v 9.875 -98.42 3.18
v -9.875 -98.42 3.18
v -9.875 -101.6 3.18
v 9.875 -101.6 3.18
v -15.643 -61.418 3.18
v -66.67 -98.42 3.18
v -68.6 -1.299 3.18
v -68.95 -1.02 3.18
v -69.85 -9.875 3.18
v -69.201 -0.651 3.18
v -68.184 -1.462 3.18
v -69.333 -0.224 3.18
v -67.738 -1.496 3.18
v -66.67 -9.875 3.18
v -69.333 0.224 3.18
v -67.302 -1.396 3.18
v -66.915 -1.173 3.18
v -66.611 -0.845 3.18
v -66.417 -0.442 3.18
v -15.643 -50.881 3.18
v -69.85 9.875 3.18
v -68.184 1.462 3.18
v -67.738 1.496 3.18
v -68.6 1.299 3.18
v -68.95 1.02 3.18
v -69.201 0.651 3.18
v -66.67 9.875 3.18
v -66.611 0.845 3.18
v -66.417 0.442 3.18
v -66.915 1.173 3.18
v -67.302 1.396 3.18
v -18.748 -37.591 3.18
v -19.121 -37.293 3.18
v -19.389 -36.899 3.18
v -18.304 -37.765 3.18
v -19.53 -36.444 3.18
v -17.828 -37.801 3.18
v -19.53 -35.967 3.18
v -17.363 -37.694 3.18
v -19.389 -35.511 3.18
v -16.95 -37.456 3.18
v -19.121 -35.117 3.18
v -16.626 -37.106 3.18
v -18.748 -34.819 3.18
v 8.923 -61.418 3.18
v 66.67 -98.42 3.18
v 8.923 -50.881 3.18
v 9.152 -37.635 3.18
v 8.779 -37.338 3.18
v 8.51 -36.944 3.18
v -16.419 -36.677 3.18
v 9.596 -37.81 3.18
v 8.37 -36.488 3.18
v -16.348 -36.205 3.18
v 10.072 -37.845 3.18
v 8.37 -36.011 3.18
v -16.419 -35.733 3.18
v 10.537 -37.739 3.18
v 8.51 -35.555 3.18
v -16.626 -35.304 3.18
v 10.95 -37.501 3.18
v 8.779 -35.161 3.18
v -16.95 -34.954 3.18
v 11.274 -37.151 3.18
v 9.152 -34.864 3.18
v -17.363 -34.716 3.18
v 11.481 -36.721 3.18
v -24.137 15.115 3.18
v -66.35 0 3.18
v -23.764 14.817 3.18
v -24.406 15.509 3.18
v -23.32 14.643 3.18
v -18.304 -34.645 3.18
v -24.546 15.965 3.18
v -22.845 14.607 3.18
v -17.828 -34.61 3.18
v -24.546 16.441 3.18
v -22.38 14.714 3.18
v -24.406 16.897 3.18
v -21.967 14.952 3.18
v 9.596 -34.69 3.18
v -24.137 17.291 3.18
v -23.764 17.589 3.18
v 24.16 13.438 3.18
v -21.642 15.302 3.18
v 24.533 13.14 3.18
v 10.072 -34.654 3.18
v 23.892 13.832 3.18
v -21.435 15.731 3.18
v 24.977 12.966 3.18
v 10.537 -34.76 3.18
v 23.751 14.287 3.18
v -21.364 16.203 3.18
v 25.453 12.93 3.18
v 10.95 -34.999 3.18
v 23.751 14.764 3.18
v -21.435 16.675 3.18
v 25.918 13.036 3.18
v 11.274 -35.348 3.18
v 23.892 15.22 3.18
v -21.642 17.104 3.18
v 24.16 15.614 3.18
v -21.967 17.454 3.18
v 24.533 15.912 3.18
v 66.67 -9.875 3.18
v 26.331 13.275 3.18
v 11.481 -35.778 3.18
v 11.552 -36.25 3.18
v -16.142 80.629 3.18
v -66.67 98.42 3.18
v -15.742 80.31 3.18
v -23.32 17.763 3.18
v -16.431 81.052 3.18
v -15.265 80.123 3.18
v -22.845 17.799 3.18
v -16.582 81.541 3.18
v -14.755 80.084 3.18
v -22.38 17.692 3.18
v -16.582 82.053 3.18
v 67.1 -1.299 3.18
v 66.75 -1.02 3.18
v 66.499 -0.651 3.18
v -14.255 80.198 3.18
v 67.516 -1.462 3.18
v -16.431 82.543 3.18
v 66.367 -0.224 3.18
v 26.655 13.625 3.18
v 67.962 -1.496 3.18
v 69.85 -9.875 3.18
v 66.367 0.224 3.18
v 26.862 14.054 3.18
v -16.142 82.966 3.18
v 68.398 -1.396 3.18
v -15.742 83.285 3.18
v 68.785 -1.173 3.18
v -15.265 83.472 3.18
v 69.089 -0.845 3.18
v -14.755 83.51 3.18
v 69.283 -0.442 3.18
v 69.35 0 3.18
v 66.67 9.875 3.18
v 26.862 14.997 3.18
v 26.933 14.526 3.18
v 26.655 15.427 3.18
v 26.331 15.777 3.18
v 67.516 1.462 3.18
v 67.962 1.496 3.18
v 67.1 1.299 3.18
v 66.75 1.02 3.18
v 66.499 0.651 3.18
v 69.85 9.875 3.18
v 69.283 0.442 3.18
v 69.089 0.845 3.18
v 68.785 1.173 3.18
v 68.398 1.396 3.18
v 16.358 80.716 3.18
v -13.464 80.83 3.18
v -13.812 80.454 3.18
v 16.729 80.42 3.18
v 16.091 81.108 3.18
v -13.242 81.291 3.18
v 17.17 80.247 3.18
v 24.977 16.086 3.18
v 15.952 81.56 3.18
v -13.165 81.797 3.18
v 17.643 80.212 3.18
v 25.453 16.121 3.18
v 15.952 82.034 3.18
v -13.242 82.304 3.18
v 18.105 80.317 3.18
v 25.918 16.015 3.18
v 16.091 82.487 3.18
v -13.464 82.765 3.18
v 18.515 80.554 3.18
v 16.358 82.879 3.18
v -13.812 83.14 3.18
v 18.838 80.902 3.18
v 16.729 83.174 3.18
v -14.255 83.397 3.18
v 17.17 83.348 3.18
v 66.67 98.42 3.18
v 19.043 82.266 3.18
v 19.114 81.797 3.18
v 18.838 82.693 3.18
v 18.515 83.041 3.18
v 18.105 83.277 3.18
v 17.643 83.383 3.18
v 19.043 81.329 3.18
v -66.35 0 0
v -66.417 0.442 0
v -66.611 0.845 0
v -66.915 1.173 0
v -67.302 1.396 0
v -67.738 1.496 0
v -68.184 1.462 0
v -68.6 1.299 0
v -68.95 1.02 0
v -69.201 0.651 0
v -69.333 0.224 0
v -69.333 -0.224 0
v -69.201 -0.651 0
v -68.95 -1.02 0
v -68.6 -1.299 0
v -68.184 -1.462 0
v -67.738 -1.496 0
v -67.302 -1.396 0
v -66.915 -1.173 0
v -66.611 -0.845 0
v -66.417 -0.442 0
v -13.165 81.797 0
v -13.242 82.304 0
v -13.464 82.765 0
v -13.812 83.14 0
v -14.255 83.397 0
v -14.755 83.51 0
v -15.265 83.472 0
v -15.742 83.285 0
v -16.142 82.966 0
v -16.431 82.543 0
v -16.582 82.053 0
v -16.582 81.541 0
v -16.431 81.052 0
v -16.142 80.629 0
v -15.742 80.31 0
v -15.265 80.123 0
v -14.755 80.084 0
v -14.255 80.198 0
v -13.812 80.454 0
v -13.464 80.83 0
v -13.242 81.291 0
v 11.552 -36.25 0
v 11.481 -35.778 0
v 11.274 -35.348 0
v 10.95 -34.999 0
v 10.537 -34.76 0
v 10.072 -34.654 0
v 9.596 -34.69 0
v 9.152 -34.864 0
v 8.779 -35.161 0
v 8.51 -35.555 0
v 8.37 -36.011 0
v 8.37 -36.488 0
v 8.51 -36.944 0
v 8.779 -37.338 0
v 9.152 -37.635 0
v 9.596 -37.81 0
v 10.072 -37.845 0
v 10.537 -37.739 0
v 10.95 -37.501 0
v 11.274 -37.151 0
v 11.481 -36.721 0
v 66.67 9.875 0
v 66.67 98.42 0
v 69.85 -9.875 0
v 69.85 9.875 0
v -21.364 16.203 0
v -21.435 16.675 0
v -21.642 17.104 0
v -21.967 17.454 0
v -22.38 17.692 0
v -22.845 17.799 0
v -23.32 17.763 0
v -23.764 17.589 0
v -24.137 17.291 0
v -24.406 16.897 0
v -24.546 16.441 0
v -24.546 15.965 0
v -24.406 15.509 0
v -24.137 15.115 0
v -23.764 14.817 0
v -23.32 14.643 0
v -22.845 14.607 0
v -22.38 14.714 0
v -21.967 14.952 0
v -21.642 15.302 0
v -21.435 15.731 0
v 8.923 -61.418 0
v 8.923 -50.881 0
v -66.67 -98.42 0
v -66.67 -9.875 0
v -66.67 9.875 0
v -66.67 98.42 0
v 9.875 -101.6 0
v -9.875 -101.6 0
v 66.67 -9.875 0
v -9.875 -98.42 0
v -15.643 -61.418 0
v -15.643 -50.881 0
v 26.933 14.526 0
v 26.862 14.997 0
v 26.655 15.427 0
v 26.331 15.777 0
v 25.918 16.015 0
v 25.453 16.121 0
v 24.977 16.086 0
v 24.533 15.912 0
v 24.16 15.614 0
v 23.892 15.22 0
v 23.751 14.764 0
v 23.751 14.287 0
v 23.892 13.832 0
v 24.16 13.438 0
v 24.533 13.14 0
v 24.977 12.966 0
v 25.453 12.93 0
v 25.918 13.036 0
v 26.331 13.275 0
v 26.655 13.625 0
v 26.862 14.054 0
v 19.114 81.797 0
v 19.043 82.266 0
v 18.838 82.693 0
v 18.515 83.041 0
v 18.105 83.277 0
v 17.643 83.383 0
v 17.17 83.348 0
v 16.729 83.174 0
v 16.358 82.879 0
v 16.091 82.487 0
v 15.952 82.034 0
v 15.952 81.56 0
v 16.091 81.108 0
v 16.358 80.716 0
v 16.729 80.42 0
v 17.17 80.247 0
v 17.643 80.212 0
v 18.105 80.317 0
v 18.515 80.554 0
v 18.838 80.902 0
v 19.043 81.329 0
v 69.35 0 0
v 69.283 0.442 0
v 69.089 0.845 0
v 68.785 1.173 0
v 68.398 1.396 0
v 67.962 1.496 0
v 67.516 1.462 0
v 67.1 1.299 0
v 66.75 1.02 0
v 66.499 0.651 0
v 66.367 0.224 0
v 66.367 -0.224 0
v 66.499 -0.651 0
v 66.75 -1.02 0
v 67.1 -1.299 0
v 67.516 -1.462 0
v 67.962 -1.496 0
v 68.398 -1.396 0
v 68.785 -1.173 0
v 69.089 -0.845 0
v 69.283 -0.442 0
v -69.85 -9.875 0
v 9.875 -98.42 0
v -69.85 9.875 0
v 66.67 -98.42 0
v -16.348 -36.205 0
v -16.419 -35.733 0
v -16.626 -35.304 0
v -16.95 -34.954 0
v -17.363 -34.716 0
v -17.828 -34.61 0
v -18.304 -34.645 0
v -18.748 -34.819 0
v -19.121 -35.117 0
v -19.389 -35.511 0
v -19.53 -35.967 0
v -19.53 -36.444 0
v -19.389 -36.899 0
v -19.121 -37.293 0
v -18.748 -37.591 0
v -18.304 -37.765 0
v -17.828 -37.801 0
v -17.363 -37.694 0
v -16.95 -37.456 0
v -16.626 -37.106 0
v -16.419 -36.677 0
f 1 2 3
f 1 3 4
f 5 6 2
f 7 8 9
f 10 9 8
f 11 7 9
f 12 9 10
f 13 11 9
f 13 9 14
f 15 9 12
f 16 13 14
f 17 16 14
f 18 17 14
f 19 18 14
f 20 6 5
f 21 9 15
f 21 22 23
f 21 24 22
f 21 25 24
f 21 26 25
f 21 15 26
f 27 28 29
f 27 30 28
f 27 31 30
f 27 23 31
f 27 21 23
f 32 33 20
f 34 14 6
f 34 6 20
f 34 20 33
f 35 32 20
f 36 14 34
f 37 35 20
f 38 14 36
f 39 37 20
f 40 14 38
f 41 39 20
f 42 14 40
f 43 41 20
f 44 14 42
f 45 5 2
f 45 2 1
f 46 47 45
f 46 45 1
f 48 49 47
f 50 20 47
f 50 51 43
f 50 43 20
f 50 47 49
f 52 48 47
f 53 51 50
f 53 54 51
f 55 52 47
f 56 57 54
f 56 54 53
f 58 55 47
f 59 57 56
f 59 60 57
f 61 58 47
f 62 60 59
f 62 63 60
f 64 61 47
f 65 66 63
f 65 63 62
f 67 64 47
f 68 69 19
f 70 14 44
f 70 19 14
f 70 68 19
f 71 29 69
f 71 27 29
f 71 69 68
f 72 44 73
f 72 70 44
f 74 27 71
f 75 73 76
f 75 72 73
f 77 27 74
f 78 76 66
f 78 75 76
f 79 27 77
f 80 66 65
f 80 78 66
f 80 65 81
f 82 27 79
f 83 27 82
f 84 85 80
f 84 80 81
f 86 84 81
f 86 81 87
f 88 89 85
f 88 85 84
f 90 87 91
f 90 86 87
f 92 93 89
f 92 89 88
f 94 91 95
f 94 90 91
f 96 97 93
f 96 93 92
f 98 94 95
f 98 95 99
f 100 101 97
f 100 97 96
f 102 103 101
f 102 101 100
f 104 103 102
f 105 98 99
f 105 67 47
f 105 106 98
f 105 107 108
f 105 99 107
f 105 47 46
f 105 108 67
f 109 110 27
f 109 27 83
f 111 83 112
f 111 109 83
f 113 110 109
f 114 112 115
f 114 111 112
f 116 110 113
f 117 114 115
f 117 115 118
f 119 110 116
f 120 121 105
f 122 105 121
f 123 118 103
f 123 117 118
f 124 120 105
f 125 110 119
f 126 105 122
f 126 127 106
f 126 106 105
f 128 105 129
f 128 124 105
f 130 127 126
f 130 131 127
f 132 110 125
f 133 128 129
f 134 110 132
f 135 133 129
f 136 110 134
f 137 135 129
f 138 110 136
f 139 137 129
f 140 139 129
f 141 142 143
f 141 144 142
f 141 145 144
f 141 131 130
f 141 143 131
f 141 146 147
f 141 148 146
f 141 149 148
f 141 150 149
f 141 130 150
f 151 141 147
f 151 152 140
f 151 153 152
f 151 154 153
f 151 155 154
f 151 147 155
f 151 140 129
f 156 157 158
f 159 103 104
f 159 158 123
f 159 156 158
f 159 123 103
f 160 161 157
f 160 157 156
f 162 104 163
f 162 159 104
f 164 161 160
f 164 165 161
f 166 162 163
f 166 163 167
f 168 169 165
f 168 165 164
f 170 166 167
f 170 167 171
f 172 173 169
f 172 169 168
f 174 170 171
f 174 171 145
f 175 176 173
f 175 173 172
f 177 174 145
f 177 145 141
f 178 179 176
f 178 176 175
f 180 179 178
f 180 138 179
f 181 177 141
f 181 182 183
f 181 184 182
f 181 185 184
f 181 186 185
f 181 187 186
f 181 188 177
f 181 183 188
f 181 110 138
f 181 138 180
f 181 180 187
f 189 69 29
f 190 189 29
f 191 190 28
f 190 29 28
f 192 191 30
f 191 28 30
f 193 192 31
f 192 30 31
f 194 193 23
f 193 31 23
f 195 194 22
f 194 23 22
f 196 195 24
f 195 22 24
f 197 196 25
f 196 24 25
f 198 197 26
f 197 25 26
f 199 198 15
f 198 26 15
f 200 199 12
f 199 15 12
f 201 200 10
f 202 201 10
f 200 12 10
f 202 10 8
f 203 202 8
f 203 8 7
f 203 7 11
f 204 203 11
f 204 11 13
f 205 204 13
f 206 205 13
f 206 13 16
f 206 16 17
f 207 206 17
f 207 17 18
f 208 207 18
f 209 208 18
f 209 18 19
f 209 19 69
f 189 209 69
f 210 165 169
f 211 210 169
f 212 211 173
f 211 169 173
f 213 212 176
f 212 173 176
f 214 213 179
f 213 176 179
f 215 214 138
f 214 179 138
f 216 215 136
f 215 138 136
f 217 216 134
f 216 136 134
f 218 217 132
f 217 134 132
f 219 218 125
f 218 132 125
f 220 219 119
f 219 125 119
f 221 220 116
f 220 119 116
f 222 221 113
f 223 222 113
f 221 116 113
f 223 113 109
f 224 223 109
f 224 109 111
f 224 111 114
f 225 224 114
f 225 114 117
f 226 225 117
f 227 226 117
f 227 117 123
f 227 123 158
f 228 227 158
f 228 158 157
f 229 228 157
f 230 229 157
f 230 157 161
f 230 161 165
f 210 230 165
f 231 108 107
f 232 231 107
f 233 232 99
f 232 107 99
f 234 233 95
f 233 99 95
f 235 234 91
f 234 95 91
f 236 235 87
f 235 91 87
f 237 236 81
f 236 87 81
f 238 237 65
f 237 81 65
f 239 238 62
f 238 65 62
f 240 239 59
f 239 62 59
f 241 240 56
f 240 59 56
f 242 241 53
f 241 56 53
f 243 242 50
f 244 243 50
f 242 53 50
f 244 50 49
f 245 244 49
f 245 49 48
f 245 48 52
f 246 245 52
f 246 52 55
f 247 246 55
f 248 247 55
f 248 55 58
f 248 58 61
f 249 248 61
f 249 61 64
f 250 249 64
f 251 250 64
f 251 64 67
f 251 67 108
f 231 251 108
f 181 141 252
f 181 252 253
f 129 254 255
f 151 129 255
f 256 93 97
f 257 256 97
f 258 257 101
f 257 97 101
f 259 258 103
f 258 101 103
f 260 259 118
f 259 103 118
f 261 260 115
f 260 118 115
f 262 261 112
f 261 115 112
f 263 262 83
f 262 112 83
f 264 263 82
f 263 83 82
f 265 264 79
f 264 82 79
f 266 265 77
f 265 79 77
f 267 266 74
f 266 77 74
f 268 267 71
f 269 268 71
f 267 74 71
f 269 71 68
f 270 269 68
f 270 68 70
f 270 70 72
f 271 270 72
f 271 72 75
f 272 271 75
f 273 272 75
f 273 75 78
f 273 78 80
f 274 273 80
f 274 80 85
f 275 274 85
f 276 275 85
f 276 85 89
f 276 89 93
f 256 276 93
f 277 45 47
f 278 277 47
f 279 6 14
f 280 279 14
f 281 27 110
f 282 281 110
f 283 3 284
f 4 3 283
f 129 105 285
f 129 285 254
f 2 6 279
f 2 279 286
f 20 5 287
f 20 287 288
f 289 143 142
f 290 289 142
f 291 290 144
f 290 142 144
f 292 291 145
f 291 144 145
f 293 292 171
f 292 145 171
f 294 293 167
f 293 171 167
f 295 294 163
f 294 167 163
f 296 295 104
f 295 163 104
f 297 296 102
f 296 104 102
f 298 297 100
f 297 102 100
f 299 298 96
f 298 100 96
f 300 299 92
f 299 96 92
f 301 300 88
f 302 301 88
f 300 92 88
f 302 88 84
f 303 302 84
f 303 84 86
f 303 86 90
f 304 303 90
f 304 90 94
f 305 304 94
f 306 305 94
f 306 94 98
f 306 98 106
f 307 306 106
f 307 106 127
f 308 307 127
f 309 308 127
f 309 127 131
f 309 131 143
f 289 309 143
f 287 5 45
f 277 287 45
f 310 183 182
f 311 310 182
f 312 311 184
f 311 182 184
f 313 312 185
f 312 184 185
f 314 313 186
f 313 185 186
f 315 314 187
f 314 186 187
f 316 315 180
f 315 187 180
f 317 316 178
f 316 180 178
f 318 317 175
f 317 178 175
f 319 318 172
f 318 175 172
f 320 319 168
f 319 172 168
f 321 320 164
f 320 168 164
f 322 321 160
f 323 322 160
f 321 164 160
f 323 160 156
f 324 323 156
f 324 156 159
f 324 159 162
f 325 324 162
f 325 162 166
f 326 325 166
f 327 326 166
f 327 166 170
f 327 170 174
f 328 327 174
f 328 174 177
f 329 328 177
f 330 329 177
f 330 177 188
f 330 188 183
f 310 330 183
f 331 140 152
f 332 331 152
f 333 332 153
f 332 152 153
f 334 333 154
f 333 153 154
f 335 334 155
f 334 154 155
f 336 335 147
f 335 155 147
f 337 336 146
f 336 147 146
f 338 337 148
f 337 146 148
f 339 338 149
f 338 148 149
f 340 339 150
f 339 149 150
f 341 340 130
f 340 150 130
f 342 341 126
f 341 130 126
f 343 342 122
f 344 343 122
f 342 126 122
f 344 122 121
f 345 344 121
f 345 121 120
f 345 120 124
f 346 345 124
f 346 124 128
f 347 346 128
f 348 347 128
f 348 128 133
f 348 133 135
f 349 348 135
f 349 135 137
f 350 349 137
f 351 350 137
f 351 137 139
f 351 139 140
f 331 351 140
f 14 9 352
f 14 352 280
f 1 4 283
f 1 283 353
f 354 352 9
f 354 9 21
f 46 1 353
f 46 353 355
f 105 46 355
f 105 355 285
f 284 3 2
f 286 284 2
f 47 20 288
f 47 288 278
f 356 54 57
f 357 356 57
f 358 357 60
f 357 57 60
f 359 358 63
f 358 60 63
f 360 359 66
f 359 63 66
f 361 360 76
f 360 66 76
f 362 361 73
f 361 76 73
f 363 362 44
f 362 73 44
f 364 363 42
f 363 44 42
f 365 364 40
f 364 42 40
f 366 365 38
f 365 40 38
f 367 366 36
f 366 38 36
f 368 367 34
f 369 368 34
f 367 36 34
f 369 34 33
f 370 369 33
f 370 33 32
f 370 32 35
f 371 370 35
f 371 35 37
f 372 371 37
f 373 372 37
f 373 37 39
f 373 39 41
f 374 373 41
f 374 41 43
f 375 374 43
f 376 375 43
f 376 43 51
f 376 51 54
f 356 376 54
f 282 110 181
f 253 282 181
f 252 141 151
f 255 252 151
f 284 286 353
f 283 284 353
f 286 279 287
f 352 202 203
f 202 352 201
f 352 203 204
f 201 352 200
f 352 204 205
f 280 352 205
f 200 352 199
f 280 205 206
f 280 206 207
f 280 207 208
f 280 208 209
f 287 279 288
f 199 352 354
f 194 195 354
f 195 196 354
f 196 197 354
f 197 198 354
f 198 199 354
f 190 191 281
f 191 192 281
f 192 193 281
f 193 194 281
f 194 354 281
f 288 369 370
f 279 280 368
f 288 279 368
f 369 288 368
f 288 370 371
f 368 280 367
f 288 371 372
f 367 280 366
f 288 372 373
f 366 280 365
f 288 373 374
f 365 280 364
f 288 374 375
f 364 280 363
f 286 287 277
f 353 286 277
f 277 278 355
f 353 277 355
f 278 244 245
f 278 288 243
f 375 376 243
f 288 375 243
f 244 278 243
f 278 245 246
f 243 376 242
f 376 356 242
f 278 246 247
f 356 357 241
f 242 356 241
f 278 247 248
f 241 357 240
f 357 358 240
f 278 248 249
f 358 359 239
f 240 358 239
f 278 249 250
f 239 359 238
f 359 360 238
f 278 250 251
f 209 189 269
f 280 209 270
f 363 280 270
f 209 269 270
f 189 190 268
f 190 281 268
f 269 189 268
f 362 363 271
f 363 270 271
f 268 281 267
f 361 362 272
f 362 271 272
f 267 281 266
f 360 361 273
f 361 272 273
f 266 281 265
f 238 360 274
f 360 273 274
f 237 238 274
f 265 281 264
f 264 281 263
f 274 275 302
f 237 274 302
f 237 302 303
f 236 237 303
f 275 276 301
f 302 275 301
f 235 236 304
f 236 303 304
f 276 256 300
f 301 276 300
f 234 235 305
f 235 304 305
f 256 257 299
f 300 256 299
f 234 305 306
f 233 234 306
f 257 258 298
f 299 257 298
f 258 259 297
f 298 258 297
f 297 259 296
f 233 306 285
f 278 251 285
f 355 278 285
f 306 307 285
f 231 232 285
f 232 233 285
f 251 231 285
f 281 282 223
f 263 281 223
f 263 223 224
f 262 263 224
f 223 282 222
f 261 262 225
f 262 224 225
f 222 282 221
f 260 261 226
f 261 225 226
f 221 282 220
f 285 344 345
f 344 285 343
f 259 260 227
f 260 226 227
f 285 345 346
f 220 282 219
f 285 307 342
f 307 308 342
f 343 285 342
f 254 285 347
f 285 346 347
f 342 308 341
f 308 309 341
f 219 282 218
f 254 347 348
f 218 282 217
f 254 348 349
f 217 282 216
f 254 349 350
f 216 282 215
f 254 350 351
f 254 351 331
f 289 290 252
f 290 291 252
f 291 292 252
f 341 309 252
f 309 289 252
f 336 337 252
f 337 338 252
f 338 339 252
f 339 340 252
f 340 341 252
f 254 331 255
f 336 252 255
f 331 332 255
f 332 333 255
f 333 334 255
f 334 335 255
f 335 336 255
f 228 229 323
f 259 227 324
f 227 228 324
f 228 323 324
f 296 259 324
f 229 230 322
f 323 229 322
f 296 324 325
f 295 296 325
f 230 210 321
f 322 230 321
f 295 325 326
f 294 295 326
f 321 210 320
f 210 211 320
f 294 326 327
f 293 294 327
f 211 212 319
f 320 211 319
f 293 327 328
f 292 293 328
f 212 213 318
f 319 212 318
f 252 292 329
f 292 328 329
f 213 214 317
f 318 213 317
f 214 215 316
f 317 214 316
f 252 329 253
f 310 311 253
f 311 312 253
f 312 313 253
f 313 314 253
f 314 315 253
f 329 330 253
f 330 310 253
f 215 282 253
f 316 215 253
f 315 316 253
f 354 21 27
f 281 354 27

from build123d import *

# Parameters (mm, degrees)
SKETCH1_W           = 139.7
SKETCH1_H           = 203.2
BOSS_EXTRUDE1_DEPTH = 3.18
SKETCH2_R           = 1.5
SKETCH2_W           = 3.18
SKETCH2_H           = 91.725
CUT_EXTRUDE1_DEPTH  = 4.18
SKETCH3_R           = 1.59
CUT_EXTRUDE2_DEPTH  = 4.18
SKETCH4_R           = 1.59
CUT_EXTRUDE3_DEPTH  = 4.18
SKETCH5_W           = 88.895716174
SKETCH5_H           = 168.56277979
BOSS_EXTRUDE2_DEPTH = 3.18
SKETCH6_W           = 20
SKETCH6_H           = 203.2
BOSS_EXTRUDE3_DEPTH = 3.18
SKETCH7_W           = 56.795
SKETCH7_H           = 3.18
CUT_EXTRUDE4_DEPTH  = 4.18
SKETCH8_W           = 133.34
SKETCH8_H           = 3.18
CUT_EXTRUDE5_DEPTH  = 4.18
SKETCH9_R           = 1.6
CUT_EXTRUDE6_DEPTH  = 4.18
SKETCH10_W          = 24.565797096
SKETCH10_H          = 10.537213664
CUT_EXTRUDE7_DEPTH  = 3.18
SKETCH11_R          = 1.59
SKETCH11_R_2        = 1.71788268
CUT_EXTRUDE8_DEPTH  = 35


with BuildPart() as part:
    # Sketch1 → Boss-Extrude1 (new body)
    with BuildSketch(Plane.XY):
        Rectangle(SKETCH1_W, SKETCH1_H)
    extrude(amount=BOSS_EXTRUDE1_DEPTH)

    # Sketch2 → Cut-Extrude1 (cut, through all)
    with BuildSketch(Plane.XY.offset(3.18)):
        with Locations((-67.85, 0)):
            Circle(SKETCH2_R)
        with Locations((67.85, 0)):
            Circle(SKETCH2_R)
        Polygon((-10, 101.6), (10, 101.6), (10, 98.42), (1.5, 98.42), (1.5, 94.42), (3.5, 94.42), (3.5, 91.42), (1.5, 91.42), (1.5, 88.42), (-1.5, 88.42), (-1.5, 91.42), (-3.5, 91.42), (-3.5, 94.42), (-1.5, 94.42), (-1.5, 98.42), (-10, 98.42), align=None)
        Polygon((-10, -101.6), (-10, -98.42), (-1.5, -98.42), (-1.5, -94.42), (-3.5, -94.42), (-3.5, -91.42), (-1.5, -91.42), (-1.5, -88.42), (1.5, -88.42), (1.5, -91.42), (3.5, -91.42), (3.5, -94.42), (1.5, -94.42), (1.5, -98.42), (10, -98.42), (10, -101.6), align=None)
        with Locations((-68.26, 55.7375)):
            Rectangle(SKETCH2_W, SKETCH2_H)
        with Locations((-68.26, -55.7375)):
            Rectangle(SKETCH2_W, SKETCH2_H)
        with Locations((68.26, -55.7375)):
            Rectangle(SKETCH2_W, SKETCH2_H)
        with Locations((68.26, 55.7375)):
            Rectangle(SKETCH2_W, SKETCH2_H)
    extrude(amount=-CUT_EXTRUDE1_DEPTH, mode=Mode.SUBTRACT)

    # Sketch3 → Cut-Extrude2 (cut, through all)
    with BuildSketch(Plane(origin=(0, 0, 0), x_dir=(-1, 0, 0), z_dir=(0, 0, -1))):
        with Locations((-35.67127699, -47.963396943)):
            Circle(SKETCH3_R)
        with Locations((-35.67127699, -30.777287406)):
            Circle(SKETCH3_R)
    extrude(amount=-CUT_EXTRUDE2_DEPTH, mode=Mode.SUBTRACT)

    # Sketch4 → Cut-Extrude3 (cut, through all)
    with BuildSketch(Plane(origin=(0, 0, 0), x_dir=(-1, 0, 0), z_dir=(0, 0, -1))):
        with Locations((-34.750723073, 80.736128989)):
            Circle(SKETCH4_R)
        with Locations((-34.750723073, 63.550019452)):
            Circle(SKETCH4_R)
        with Locations((36.249784221, 80.736128989)):
            Circle(SKETCH4_R)
        with Locations((36.249784221, 63.550019452)):
            Circle(SKETCH4_R)
        with Locations((35.983928162, -30.777287406)):
            Circle(SKETCH4_R)
        with Locations((35.983928162, -47.963396943)):
            Circle(SKETCH4_R)
        with Locations((-35.67127699, -30.777287406)):
            Circle(SKETCH4_R)
        with Locations((-35.67127699, -47.963396943)):
            Circle(SKETCH4_R)
    extrude(amount=-CUT_EXTRUDE3_DEPTH, mode=Mode.SUBTRACT)

    # Sketch5 → Boss-Extrude2 (add)
    with BuildSketch(Plane.XY.offset(3.18)):
        Rectangle(SKETCH5_W, SKETCH5_H)
    extrude(amount=-BOSS_EXTRUDE2_DEPTH)

    # Sketch6 → Boss-Extrude3 (add)
    with BuildSketch(Plane.XY.offset(3.18)):
        Rectangle(SKETCH6_W, SKETCH6_H)
    extrude(amount=-BOSS_EXTRUDE3_DEPTH)

    # Sketch7 → Cut-Extrude4 (cut, through all)
    with BuildSketch(Plane.XY.offset(3.18)):
        with Locations((-38.2725, -100.01)):
            Rectangle(SKETCH7_W, SKETCH7_H)
        with Locations((38.2725, -100.01)):
            Rectangle(SKETCH7_W, SKETCH7_H)
    extrude(amount=-CUT_EXTRUDE4_DEPTH, mode=Mode.SUBTRACT)

    # Sketch8 → Cut-Extrude5 (cut, through all)
    with BuildSketch(Plane.XY.offset(3.18)):
        with Locations((0, 100.01)):
            Rectangle(SKETCH8_W, SKETCH8_H)
    extrude(amount=-CUT_EXTRUDE5_DEPTH, mode=Mode.SUBTRACT)

    # Sketch9 → Cut-Extrude6 (cut, through all)
    with BuildSketch(Plane.XY.offset(3.18)):
        with Locations((-17.947926552, -36.205077673)):
            Circle(SKETCH9_R)
        with Locations((25.333125389, 14.525884697)):
            Circle(SKETCH9_R)
        with Locations((-22.964258499, 16.202998173)):
            Circle(SKETCH9_R)
        with Locations((9.952037888, -36.24962266)):
            Circle(SKETCH9_R)
    extrude(amount=-CUT_EXTRUDE6_DEPTH, mode=Mode.SUBTRACT)

    # Sketch10 → Cut-Extrude7 (cut)
    with BuildSketch(Plane.XY.offset(3.18)):
        with Locations((-3.359789788, -56.149532718)):
            Rectangle(SKETCH10_W, SKETCH10_H)
    extrude(amount=-CUT_EXTRUDE7_DEPTH, mode=Mode.SUBTRACT)

    # Sketch11 → Cut-Extrude8 (cut)
    with BuildSketch(Plane.XY.offset(3.18)):
        with Locations((17.523878239, 81.797398404)):
            Circle(SKETCH11_R)
        with Locations((-14.883091948, 81.797398404)):
            Circle(SKETCH11_R_2)
    extrude(amount=-CUT_EXTRUDE8_DEPTH, mode=Mode.SUBTRACT)


solid = part.part
